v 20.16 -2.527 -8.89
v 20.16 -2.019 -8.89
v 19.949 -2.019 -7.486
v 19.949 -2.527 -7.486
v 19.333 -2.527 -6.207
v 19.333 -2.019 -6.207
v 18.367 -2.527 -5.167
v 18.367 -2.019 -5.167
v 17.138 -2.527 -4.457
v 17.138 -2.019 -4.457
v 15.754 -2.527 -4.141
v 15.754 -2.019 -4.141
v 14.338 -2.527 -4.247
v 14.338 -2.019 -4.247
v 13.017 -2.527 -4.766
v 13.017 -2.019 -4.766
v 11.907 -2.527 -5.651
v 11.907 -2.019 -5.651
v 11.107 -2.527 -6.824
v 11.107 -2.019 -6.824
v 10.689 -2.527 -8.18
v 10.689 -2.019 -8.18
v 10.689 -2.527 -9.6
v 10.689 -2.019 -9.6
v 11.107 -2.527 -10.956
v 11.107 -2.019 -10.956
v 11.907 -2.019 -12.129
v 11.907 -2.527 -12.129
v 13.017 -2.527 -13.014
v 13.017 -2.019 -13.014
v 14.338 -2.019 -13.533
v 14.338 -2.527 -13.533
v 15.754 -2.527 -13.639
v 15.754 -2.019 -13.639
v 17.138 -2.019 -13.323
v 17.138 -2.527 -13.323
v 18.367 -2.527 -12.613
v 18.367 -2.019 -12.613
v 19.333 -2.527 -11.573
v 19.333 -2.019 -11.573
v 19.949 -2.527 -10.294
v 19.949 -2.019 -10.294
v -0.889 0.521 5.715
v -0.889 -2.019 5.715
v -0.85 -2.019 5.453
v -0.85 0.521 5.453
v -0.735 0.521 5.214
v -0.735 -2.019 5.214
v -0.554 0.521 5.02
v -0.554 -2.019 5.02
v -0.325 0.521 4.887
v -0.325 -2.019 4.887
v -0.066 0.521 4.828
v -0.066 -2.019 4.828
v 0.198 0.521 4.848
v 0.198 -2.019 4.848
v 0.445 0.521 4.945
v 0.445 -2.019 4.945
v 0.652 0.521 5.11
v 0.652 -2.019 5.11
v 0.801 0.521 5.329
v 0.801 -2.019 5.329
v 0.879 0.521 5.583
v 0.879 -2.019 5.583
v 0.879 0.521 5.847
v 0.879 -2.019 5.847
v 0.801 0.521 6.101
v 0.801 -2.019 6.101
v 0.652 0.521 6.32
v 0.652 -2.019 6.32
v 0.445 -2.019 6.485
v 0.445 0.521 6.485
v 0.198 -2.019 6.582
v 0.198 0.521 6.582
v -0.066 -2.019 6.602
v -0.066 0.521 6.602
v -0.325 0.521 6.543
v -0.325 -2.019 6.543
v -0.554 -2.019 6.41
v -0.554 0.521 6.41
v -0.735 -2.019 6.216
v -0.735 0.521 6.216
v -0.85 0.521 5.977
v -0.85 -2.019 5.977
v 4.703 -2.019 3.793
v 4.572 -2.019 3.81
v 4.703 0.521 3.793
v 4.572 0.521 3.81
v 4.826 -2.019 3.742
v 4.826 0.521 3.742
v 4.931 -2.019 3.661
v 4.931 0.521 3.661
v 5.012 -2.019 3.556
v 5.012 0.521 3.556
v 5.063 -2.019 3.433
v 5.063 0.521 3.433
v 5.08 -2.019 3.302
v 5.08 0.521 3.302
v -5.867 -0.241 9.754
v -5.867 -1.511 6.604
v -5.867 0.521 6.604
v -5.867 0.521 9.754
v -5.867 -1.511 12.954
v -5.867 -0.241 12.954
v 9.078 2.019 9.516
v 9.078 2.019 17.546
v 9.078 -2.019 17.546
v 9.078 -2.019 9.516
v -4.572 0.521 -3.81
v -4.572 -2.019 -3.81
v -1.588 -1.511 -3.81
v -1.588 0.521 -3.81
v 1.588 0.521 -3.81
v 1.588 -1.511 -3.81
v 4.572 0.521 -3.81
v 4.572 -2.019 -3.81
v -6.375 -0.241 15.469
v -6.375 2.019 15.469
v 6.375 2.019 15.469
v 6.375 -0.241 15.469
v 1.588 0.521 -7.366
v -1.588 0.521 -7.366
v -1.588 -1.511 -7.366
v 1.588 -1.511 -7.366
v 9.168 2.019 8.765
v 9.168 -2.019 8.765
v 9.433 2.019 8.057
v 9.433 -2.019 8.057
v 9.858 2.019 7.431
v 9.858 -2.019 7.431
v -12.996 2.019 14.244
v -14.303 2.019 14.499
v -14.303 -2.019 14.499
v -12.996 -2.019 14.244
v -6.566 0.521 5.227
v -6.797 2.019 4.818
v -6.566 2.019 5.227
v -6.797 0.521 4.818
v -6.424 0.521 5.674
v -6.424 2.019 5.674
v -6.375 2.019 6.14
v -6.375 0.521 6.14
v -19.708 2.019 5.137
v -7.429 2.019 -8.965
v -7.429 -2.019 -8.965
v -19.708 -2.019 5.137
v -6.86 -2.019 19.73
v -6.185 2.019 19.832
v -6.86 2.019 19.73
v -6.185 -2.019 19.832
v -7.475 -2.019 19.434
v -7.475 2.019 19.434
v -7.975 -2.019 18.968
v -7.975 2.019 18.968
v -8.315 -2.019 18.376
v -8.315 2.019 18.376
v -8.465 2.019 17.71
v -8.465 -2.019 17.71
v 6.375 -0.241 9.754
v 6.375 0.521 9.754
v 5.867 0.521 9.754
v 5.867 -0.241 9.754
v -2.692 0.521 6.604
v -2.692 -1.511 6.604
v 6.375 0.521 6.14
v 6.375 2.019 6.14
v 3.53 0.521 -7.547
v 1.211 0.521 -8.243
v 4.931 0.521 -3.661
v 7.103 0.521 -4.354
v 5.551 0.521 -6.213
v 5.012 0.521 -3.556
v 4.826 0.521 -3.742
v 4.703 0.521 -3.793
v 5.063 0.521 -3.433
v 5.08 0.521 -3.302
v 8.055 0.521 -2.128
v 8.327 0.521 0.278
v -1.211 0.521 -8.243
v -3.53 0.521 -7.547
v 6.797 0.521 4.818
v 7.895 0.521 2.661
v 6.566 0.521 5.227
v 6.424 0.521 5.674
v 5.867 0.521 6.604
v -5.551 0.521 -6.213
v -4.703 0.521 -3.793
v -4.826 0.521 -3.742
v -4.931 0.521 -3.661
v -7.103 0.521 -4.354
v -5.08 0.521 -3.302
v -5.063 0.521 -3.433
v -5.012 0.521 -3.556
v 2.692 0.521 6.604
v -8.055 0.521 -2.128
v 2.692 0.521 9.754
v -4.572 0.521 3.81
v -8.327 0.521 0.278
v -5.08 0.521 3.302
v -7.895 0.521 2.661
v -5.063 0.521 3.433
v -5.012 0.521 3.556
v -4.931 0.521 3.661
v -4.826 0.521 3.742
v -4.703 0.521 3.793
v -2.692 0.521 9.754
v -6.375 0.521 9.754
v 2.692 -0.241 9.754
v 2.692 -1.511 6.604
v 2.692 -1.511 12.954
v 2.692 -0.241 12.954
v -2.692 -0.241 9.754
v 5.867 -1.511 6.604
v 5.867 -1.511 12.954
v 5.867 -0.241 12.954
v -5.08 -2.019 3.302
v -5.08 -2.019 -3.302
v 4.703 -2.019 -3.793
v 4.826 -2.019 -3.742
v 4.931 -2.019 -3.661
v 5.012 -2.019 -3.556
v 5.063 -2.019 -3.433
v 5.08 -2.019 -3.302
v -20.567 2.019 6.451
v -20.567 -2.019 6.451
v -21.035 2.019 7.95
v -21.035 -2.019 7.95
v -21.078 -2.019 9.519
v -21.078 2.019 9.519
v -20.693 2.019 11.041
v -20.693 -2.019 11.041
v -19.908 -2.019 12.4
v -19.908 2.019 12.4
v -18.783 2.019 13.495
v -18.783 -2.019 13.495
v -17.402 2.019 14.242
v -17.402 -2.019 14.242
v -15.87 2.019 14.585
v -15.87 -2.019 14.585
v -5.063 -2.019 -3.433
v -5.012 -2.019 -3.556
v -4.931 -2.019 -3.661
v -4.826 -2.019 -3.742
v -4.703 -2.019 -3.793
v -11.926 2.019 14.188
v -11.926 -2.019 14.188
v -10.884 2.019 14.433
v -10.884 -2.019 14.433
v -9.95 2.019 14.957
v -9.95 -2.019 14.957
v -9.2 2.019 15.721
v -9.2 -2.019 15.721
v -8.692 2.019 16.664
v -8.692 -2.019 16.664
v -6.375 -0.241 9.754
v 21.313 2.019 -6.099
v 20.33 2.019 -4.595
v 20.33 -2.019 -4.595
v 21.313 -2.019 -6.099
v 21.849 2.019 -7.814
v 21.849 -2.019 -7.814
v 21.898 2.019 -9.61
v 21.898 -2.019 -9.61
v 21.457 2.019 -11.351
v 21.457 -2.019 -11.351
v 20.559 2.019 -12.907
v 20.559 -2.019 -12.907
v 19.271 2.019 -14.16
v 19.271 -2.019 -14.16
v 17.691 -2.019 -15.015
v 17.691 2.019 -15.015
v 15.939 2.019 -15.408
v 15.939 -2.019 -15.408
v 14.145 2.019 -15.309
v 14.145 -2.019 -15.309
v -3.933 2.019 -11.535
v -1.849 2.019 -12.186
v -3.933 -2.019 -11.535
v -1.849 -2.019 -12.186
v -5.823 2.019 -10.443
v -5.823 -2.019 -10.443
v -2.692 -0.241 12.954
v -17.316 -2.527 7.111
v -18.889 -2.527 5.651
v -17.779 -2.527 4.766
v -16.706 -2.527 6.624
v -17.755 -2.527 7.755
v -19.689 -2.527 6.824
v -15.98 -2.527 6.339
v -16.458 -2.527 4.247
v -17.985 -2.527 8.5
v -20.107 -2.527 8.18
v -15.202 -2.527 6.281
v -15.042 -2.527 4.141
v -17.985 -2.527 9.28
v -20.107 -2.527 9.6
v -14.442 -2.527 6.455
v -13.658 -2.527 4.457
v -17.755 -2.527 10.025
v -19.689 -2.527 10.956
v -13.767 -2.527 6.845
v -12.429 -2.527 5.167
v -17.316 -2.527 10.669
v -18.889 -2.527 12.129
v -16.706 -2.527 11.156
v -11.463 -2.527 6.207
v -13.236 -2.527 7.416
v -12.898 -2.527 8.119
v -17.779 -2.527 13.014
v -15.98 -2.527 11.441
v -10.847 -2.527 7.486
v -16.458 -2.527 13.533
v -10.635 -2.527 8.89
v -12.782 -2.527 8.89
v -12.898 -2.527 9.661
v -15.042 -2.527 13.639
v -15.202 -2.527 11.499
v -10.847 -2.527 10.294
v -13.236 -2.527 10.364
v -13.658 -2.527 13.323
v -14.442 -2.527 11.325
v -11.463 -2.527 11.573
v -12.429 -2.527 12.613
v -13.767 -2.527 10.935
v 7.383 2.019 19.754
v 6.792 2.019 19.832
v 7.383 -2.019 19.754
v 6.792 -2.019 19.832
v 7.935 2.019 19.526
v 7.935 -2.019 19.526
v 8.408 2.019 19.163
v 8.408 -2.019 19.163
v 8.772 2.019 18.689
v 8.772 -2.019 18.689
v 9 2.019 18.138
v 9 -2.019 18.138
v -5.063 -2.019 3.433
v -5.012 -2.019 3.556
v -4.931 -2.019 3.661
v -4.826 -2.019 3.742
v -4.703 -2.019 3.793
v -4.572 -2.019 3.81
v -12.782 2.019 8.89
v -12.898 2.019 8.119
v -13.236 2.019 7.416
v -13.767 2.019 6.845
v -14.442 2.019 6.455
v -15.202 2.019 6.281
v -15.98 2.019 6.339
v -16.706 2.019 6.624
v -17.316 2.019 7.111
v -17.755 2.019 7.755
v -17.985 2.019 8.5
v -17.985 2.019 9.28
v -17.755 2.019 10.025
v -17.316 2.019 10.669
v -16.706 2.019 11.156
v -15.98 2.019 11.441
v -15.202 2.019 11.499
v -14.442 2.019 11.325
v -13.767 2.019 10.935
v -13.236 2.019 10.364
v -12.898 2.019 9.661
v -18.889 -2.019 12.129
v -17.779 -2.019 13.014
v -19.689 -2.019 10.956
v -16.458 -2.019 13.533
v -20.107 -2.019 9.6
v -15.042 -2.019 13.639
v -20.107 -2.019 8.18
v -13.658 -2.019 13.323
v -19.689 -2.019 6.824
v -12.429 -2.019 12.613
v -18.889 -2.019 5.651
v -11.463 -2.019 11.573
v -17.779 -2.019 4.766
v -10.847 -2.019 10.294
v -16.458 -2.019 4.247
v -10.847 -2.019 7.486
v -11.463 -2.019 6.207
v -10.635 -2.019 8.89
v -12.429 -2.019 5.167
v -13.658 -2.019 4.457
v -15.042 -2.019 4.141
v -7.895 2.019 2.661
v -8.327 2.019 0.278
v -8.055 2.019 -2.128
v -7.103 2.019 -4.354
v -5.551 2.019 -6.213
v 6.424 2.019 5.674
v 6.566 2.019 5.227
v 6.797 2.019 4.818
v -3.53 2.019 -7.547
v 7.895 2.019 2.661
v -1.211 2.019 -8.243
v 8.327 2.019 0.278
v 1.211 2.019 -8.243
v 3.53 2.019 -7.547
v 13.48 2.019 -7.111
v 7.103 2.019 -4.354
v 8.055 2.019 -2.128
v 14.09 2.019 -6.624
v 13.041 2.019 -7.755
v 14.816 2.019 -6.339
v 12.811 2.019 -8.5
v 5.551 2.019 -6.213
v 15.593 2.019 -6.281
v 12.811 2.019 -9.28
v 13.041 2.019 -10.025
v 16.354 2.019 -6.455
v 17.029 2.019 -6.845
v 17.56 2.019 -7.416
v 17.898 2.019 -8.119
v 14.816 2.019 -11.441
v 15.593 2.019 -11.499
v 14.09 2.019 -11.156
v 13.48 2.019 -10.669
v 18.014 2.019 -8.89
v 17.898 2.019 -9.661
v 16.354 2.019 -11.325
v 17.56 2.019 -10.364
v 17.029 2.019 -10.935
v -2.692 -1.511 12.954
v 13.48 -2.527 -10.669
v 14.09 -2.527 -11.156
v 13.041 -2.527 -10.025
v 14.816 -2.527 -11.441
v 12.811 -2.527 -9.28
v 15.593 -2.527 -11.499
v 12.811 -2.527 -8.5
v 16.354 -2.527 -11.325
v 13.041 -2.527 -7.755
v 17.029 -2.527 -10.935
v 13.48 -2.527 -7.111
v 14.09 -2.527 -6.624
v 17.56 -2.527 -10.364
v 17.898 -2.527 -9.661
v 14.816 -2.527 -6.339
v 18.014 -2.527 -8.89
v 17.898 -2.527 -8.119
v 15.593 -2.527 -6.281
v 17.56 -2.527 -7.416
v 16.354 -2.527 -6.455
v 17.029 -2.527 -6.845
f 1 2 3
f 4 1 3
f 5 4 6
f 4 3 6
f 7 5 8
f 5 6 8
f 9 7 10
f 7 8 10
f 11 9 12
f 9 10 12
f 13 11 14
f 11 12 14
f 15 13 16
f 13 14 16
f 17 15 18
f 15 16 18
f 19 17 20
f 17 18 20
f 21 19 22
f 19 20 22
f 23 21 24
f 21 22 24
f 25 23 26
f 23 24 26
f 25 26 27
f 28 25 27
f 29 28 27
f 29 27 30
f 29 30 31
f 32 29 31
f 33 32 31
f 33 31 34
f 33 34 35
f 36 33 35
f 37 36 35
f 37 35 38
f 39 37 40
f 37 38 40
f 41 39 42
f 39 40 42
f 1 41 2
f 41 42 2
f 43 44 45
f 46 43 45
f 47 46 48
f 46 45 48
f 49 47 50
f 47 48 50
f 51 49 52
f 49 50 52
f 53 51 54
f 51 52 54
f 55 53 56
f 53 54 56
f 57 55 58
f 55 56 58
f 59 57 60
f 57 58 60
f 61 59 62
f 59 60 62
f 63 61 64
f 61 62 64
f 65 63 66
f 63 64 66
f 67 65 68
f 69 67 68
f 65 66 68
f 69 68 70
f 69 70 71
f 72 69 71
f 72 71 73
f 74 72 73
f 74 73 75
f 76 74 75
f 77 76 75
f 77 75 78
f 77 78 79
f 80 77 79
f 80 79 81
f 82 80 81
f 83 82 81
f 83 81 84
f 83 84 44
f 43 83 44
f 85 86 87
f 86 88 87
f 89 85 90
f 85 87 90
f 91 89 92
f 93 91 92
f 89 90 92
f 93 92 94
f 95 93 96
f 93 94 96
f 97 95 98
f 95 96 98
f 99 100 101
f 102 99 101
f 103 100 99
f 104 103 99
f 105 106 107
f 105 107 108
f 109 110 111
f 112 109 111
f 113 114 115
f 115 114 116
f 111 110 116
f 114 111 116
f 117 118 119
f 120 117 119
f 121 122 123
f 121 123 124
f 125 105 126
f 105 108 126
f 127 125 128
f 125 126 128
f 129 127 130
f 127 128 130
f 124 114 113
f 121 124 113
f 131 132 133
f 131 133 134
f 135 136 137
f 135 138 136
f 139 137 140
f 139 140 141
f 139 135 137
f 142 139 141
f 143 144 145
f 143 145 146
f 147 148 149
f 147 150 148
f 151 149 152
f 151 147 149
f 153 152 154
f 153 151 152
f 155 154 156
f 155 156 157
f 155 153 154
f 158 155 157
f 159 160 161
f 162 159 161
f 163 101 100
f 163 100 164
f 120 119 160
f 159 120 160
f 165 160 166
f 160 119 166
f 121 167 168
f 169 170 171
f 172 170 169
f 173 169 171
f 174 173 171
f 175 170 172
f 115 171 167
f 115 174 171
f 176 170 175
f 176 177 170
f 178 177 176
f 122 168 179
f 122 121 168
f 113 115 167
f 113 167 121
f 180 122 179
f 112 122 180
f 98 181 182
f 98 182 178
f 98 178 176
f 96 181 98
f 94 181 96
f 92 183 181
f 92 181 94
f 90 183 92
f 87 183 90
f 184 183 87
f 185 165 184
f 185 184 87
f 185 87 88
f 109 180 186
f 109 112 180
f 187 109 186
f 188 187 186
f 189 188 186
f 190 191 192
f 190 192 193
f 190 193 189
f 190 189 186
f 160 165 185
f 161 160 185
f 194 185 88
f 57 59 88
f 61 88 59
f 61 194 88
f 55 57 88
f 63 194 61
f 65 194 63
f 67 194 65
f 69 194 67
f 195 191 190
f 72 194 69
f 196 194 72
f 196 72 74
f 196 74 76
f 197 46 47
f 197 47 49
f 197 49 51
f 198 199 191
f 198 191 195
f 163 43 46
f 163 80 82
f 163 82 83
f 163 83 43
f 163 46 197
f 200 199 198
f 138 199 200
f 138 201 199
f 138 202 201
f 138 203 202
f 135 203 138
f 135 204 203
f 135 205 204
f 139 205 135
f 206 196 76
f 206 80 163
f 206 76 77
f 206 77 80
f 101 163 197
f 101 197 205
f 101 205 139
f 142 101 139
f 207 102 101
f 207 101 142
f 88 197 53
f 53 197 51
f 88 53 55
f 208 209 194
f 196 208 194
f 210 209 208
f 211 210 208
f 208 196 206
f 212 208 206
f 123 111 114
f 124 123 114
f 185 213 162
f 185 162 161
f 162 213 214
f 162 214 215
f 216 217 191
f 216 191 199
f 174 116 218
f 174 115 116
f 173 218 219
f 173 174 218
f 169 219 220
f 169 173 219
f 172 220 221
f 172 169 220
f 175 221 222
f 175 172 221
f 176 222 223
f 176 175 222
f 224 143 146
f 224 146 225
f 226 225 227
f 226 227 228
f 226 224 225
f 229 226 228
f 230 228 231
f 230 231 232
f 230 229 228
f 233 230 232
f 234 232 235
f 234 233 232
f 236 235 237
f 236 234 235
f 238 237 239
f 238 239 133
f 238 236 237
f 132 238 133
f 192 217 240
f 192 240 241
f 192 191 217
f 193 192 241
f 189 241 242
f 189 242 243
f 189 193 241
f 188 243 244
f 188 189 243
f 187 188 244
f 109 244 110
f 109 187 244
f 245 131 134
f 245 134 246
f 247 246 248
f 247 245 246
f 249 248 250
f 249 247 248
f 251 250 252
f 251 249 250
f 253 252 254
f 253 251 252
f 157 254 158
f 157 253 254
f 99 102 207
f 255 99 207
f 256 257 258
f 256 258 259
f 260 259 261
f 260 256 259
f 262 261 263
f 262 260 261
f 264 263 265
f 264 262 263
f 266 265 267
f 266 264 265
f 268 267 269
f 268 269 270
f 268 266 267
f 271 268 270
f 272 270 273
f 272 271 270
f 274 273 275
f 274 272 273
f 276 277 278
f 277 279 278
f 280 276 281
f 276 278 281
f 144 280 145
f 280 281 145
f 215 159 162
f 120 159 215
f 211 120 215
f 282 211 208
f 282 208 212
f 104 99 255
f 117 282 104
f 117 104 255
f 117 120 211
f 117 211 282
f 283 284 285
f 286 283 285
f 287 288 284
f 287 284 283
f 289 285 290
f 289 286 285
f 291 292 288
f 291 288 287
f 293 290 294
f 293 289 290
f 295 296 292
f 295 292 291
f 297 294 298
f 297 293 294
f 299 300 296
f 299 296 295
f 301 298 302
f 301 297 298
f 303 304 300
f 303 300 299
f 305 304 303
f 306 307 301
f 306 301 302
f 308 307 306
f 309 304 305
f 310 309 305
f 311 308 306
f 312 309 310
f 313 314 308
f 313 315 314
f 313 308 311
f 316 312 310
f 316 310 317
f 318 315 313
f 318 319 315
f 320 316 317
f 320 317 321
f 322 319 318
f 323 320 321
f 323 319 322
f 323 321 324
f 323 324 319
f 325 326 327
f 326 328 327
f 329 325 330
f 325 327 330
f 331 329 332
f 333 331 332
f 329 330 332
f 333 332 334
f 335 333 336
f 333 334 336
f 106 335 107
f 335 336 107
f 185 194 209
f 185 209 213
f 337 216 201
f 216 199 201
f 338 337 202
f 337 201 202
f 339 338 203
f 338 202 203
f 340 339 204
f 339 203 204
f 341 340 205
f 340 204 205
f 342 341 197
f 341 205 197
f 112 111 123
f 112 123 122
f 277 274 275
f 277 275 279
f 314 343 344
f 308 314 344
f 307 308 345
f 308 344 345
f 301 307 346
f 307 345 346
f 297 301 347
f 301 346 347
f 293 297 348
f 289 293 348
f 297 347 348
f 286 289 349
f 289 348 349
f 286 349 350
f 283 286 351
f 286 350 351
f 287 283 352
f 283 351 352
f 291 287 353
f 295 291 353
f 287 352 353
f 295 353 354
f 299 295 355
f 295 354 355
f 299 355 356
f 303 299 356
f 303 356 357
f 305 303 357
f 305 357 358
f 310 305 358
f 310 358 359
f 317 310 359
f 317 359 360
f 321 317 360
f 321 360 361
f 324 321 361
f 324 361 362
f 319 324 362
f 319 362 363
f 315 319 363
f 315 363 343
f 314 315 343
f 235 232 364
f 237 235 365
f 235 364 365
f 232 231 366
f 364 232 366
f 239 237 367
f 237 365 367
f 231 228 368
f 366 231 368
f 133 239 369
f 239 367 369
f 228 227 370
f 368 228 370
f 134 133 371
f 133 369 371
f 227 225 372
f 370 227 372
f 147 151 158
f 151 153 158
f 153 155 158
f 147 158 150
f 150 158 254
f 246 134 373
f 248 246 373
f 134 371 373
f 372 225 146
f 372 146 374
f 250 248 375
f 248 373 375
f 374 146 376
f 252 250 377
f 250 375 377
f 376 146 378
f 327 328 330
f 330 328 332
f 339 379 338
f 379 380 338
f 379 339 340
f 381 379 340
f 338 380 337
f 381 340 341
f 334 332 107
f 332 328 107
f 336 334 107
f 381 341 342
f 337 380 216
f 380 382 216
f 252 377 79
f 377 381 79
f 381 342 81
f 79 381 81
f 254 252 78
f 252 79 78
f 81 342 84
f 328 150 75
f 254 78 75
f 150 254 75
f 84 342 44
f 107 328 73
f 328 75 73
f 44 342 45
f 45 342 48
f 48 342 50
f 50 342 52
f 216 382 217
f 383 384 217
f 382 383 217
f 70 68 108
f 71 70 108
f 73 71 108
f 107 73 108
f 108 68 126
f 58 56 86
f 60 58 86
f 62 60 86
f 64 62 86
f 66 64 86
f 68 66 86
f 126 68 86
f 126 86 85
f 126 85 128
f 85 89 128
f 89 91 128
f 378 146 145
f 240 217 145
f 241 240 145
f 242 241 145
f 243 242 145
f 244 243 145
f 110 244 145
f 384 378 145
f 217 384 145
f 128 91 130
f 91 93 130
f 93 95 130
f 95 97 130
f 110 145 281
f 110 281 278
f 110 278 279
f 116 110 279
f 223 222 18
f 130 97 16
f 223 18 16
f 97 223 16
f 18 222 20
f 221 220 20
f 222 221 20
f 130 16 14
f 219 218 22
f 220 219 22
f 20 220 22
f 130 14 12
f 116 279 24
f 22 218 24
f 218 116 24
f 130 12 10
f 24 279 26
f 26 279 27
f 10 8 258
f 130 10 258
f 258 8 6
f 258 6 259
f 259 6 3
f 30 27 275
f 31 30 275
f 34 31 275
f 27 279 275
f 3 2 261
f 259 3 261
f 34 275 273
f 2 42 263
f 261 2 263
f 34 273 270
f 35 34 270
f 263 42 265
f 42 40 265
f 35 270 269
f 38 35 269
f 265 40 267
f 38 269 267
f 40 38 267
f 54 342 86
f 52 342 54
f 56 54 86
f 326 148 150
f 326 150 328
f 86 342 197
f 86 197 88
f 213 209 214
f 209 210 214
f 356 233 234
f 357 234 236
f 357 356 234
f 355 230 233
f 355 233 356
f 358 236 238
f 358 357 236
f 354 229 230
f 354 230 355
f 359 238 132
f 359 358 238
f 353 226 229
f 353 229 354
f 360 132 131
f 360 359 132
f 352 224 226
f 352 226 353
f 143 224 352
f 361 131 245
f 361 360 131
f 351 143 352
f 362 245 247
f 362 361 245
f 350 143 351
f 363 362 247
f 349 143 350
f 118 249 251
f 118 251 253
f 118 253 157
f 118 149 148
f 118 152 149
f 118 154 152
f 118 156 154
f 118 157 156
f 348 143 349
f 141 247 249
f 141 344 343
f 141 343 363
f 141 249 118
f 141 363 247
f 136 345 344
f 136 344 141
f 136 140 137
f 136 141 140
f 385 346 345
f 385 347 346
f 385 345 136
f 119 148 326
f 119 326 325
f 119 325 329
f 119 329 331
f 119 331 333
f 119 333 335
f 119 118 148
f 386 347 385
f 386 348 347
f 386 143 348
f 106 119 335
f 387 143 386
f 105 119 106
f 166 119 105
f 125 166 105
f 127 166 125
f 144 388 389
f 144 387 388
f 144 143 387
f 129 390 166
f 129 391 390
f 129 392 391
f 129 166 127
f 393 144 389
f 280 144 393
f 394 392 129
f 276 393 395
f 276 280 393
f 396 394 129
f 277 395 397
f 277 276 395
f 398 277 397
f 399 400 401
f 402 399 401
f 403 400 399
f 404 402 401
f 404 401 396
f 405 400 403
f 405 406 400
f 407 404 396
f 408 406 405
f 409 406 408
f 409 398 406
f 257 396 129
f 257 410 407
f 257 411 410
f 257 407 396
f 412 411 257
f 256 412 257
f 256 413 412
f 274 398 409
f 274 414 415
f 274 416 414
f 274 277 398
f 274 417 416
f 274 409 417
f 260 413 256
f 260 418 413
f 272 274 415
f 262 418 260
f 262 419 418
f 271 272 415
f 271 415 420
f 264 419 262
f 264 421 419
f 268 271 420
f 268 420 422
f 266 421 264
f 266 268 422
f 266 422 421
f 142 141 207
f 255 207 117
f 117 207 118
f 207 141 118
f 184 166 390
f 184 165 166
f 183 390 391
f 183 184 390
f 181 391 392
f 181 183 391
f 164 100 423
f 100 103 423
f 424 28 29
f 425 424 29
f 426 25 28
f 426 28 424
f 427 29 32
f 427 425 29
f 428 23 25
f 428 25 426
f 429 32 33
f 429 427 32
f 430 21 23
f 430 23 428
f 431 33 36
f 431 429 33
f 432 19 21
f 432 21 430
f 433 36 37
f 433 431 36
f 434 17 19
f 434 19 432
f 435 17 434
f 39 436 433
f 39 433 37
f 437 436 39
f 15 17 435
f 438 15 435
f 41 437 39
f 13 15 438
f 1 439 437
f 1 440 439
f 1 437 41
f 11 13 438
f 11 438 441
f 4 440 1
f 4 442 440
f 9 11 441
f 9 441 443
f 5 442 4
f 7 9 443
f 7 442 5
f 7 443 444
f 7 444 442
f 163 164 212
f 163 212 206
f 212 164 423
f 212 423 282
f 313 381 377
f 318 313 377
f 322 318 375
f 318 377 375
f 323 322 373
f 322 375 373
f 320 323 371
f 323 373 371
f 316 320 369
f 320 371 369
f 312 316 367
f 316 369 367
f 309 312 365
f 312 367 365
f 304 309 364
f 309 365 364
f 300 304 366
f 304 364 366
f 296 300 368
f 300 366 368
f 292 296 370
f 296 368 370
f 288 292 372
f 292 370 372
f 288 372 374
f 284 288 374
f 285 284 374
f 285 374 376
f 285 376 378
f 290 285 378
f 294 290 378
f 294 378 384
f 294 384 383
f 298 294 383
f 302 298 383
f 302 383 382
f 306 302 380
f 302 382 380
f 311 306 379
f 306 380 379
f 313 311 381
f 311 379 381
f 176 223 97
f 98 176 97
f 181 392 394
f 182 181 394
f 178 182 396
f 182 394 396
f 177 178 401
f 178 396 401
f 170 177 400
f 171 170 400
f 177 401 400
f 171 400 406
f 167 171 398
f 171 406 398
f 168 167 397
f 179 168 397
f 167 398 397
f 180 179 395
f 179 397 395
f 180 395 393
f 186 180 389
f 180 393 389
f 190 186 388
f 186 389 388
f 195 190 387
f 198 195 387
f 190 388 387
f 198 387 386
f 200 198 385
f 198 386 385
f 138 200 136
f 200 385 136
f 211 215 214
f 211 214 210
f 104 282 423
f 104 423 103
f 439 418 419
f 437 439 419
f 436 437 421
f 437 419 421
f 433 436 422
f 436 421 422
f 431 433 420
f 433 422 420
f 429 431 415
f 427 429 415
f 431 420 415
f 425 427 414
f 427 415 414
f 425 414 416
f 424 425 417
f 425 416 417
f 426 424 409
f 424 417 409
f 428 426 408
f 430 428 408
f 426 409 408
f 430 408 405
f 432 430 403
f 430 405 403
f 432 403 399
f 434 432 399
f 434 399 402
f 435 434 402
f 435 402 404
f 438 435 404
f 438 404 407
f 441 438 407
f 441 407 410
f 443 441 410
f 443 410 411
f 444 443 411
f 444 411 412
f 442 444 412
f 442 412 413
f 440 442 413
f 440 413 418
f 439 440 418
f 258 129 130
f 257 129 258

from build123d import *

# Parameters (mm, degrees)
BOSS_EXTRUDE1_DEPTH            = 4.0386
SKETCH2_R                      = 4.7625
BOSS_EXTRUDE2_DEPTH            = 0.508
SKETCH3_R                      = 4.7625
BOSS_EXTRUDE3_DEPTH            = 0.508
CUT_EXTRUDE1_DEPTH             = 1.4986
SKETCH5_W                      = 12.7508
SKETCH5_H                      = 5.715
CUT_EXTRUDE2_DEPTH             = 0.762
SKETCH6_W                      = 3.175
SKETCH6_H                      = 3.2004
CUT_EXTRUDE3_DEPTH             = 1.27
SKETCH7_W                      = 3.175
SKETCH7_H                      = 3.2004
CUT_EXTRUDE4_DEPTH             = 1.27
SKETCH8_W                      = 3.175
SKETCH8_H                      = 2.032
CUT_EXTRUDE5_DEPTH             = 3.1496
SKETCH9_W                      = 3.175
SKETCH9_H                      = 2.032
CUT_EXTRUDE6_DEPTH             = 3.1496
SKETCH10_W                     = 10.16
SKETCH10_H                     = 7.62
CUT_EXTRUDE7_DEPTH             = 5.0386
SKETCH11_W                     = 3.175
SKETCH11_H                     = 2.032
CUT_EXTRUDE8_DEPTH             = 3.556
F_10_CLEARANCE_HOLE1_D         = 5.2324
F_10_CLEARANCE_HOLE1_DEPTH     = 4.5466
F_50_0_07_DIAMETER_HOLE1_D     = 1.778
F_50_0_07_DIAMETER_HOLE1_DEPTH = 3.048
FILLET1_R                      = 0.508
FILLET3_R                      = 2.286
FILLET4_R                      = 3.175
FILLET5_R                      = 9.9187


with BuildPart() as part:
    # Sketch1 → Boss-Extrude1 (new body)
    with BuildSketch(Plane(origin=(0, 2.0193, 0), x_dir=(1, 0, 0), z_dir=(0, 1, 0))):
        with BuildLine():
            Line((-8.93437079, -19.83232), (9.077817244, -19.83232))
            Line((9.077817244, -19.83232), (9.077817244, -8.327843243))
            Line((9.077817244, -8.327843243), (20.330239386, 4.595371256))
            ThreePointArc((20.330239386, 4.595371256), (21.061730892, 12.159996), (14.144827941, 15.308818145))
            Line((14.144827941, 15.308818145), (-5.192523198, 11.533713998))
            Line((-5.192523198, 11.533713998), (-19.708049879, -5.137120292))
            ThreePointArc((-19.708049879, -5.137120292), (-20.347266862, -11.7475), (-14.302901614, -14.499111708))
            Line((-14.302901614, -14.499111708), (-12.995647781, -14.243905122))
            ThreePointArc((-12.995647781, -14.243905122), (-9.183549937, -15.74346998), (-8.93437079, -19.83232))
        make_face()
    extrude(amount=-BOSS_EXTRUDE1_DEPTH)

    # Sketch2 → Boss-Extrude2 (add)
    with BuildSketch(Plane.XZ.offset(2.0193)):
        with Locations((15.397931679, -8.89)):
            Circle(SKETCH2_R)
    extrude(amount=BOSS_EXTRUDE2_DEPTH)

    # Sketch3 → Boss-Extrude3 (add)
    with BuildSketch(Plane.XZ.offset(2.0193)):
        with Locations((-15.397931679, 8.89)):
            Circle(SKETCH3_R)
    extrude(amount=BOSS_EXTRUDE3_DEPTH)

    # Sketch4 → Cut-Extrude1 (cut)
    with BuildSketch(Plane(origin=(0, 2.0193, 0), x_dir=(-1, 0, 0), z_dir=(0, 1, 0))):
        with BuildLine():
            Line((6.3754, 5.363130455), (6.3754, 15.4686))
            Line((6.3754, 15.4686), (-6.3754, 15.4686))
            Line((-6.3754, 15.4686), (-6.3754, 5.363130455))
            ThreePointArc((-6.3754, 5.363130455), (0, -8.3312), (6.3754, 5.363130455))
        make_face()
    extrude(amount=-CUT_EXTRUDE1_DEPTH, mode=Mode.SUBTRACT)

    # Sketch5 → Cut-Extrude2 (cut)
    with BuildSketch(Plane(origin=(0, 0.5207, 0), x_dir=(-1, 0, 0), z_dir=(0, 1, 0))):
        with Locations((0, 12.6111)):
            Rectangle(SKETCH5_W, SKETCH5_H)
    extrude(amount=-CUT_EXTRUDE2_DEPTH, mode=Mode.SUBTRACT)

    # Sketch6 → Cut-Extrude3 (cut)
    with BuildSketch(Plane(origin=(0, -0.2413, 0), x_dir=(-1, 0, 0), z_dir=(0, 1, 0))):
        with Locations((4.2799, 11.3538)):
            Rectangle(SKETCH6_W, SKETCH6_H)
    extrude(amount=-CUT_EXTRUDE3_DEPTH, mode=Mode.SUBTRACT)

    # Sketch7 → Cut-Extrude4 (cut)
    with BuildSketch(Plane(origin=(0, -0.2413, 0), x_dir=(-1, 0, 0), z_dir=(0, 1, 0))):
        with Locations((-4.2799, 11.3538)):
            Rectangle(SKETCH7_W, SKETCH7_H)
    extrude(amount=-CUT_EXTRUDE4_DEPTH, mode=Mode.SUBTRACT)

    # Sketch8 → Cut-Extrude5 (cut)
    with BuildSketch(Plane.XY.offset(9.7536)):
        with Locations((4.2799, -0.4953)):
            Rectangle(SKETCH8_W, SKETCH8_H)
    extrude(amount=-CUT_EXTRUDE5_DEPTH, mode=Mode.SUBTRACT)

    # Sketch9 → Cut-Extrude6 (cut)
    with BuildSketch(Plane.XY.offset(9.7536)):
        with Locations((-4.2799, -0.4953)):
            Rectangle(SKETCH9_W, SKETCH9_H)
    extrude(amount=-CUT_EXTRUDE6_DEPTH, mode=Mode.SUBTRACT)

    # Sketch10 → Cut-Extrude7 (cut, through all)
    with BuildSketch(Plane.XZ.offset(2.0193)):
        Rectangle(SKETCH10_W, SKETCH10_H)
    extrude(amount=-CUT_EXTRUDE7_DEPTH, mode=Mode.SUBTRACT)

    # Sketch11 → Cut-Extrude8 (cut)
    with BuildSketch(Plane.XY.offset(-3.81)):
        with Locations((0, -0.4953)):
            Rectangle(SKETCH11_W, SKETCH11_H)
    extrude(amount=-CUT_EXTRUDE8_DEPTH, mode=Mode.SUBTRACT)

    # #10 Clearance Hole1
    with Locations(Plane(origin=(0, -2.5273, 0), x_dir=(-1, 0, 0), z_dir=(0, -1, 0))):
        with Locations((15.397931679, -8.89), (-15.397931679, 8.89)):
            Hole(F_10_CLEARANCE_HOLE1_D / 2, depth=F_10_CLEARANCE_HOLE1_DEPTH)

    # #50 (0.07) Diameter Hole1
    with Locations(Plane(origin=(0, 0.5207, 0), x_dir=(1, 0, 0), z_dir=(0, 1, 0))):
        with Locations((0, -5.715)):
            Hole(F_50_0_07_DIAMETER_HOLE1_D / 2, depth=F_50_0_07_DIAMETER_HOLE1_DEPTH)

    # Fillet1
    fillet1_edges = [part.edges().sort_by_distance(p)[0] for p in [
        (-5.08, -0.7493, 3.81),
        (5.08, -0.7493, 3.81),
        (5.08, -0.7493, -3.81),
        (-5.08, -0.7493, -3.81),
    ]]
    fillet(fillet1_edges, radius=FILLET1_R)

    # Fillet3
    fillet3_edges = [part.edges().sort_by_distance(p)[0] for p in [
        (9.077817244, 0, 19.83232),
        (-8.93437079, 0, 19.83232),
        (-6.3754, 1.27, 5.363130455),
        (6.3754, 1.27, 5.363130455),
    ]]
    fillet(fillet3_edges, radius=FILLET3_R)

    # Fillet4
    fillet4_edges = [part.edges().sort_by_distance(p)[0] for p in [
        (9.077817244, 0, 8.327843243),
    ]]
    fillet(fillet4_edges, radius=FILLET4_R)

    # Fillet5
    fillet5_edges = [part.edges().sort_by_distance(p)[0] for p in [
        (-5.192523198, 0, -11.533713998),
    ]]
    fillet(fillet5_edges, radius=FILLET5_R)


solid = part.part
